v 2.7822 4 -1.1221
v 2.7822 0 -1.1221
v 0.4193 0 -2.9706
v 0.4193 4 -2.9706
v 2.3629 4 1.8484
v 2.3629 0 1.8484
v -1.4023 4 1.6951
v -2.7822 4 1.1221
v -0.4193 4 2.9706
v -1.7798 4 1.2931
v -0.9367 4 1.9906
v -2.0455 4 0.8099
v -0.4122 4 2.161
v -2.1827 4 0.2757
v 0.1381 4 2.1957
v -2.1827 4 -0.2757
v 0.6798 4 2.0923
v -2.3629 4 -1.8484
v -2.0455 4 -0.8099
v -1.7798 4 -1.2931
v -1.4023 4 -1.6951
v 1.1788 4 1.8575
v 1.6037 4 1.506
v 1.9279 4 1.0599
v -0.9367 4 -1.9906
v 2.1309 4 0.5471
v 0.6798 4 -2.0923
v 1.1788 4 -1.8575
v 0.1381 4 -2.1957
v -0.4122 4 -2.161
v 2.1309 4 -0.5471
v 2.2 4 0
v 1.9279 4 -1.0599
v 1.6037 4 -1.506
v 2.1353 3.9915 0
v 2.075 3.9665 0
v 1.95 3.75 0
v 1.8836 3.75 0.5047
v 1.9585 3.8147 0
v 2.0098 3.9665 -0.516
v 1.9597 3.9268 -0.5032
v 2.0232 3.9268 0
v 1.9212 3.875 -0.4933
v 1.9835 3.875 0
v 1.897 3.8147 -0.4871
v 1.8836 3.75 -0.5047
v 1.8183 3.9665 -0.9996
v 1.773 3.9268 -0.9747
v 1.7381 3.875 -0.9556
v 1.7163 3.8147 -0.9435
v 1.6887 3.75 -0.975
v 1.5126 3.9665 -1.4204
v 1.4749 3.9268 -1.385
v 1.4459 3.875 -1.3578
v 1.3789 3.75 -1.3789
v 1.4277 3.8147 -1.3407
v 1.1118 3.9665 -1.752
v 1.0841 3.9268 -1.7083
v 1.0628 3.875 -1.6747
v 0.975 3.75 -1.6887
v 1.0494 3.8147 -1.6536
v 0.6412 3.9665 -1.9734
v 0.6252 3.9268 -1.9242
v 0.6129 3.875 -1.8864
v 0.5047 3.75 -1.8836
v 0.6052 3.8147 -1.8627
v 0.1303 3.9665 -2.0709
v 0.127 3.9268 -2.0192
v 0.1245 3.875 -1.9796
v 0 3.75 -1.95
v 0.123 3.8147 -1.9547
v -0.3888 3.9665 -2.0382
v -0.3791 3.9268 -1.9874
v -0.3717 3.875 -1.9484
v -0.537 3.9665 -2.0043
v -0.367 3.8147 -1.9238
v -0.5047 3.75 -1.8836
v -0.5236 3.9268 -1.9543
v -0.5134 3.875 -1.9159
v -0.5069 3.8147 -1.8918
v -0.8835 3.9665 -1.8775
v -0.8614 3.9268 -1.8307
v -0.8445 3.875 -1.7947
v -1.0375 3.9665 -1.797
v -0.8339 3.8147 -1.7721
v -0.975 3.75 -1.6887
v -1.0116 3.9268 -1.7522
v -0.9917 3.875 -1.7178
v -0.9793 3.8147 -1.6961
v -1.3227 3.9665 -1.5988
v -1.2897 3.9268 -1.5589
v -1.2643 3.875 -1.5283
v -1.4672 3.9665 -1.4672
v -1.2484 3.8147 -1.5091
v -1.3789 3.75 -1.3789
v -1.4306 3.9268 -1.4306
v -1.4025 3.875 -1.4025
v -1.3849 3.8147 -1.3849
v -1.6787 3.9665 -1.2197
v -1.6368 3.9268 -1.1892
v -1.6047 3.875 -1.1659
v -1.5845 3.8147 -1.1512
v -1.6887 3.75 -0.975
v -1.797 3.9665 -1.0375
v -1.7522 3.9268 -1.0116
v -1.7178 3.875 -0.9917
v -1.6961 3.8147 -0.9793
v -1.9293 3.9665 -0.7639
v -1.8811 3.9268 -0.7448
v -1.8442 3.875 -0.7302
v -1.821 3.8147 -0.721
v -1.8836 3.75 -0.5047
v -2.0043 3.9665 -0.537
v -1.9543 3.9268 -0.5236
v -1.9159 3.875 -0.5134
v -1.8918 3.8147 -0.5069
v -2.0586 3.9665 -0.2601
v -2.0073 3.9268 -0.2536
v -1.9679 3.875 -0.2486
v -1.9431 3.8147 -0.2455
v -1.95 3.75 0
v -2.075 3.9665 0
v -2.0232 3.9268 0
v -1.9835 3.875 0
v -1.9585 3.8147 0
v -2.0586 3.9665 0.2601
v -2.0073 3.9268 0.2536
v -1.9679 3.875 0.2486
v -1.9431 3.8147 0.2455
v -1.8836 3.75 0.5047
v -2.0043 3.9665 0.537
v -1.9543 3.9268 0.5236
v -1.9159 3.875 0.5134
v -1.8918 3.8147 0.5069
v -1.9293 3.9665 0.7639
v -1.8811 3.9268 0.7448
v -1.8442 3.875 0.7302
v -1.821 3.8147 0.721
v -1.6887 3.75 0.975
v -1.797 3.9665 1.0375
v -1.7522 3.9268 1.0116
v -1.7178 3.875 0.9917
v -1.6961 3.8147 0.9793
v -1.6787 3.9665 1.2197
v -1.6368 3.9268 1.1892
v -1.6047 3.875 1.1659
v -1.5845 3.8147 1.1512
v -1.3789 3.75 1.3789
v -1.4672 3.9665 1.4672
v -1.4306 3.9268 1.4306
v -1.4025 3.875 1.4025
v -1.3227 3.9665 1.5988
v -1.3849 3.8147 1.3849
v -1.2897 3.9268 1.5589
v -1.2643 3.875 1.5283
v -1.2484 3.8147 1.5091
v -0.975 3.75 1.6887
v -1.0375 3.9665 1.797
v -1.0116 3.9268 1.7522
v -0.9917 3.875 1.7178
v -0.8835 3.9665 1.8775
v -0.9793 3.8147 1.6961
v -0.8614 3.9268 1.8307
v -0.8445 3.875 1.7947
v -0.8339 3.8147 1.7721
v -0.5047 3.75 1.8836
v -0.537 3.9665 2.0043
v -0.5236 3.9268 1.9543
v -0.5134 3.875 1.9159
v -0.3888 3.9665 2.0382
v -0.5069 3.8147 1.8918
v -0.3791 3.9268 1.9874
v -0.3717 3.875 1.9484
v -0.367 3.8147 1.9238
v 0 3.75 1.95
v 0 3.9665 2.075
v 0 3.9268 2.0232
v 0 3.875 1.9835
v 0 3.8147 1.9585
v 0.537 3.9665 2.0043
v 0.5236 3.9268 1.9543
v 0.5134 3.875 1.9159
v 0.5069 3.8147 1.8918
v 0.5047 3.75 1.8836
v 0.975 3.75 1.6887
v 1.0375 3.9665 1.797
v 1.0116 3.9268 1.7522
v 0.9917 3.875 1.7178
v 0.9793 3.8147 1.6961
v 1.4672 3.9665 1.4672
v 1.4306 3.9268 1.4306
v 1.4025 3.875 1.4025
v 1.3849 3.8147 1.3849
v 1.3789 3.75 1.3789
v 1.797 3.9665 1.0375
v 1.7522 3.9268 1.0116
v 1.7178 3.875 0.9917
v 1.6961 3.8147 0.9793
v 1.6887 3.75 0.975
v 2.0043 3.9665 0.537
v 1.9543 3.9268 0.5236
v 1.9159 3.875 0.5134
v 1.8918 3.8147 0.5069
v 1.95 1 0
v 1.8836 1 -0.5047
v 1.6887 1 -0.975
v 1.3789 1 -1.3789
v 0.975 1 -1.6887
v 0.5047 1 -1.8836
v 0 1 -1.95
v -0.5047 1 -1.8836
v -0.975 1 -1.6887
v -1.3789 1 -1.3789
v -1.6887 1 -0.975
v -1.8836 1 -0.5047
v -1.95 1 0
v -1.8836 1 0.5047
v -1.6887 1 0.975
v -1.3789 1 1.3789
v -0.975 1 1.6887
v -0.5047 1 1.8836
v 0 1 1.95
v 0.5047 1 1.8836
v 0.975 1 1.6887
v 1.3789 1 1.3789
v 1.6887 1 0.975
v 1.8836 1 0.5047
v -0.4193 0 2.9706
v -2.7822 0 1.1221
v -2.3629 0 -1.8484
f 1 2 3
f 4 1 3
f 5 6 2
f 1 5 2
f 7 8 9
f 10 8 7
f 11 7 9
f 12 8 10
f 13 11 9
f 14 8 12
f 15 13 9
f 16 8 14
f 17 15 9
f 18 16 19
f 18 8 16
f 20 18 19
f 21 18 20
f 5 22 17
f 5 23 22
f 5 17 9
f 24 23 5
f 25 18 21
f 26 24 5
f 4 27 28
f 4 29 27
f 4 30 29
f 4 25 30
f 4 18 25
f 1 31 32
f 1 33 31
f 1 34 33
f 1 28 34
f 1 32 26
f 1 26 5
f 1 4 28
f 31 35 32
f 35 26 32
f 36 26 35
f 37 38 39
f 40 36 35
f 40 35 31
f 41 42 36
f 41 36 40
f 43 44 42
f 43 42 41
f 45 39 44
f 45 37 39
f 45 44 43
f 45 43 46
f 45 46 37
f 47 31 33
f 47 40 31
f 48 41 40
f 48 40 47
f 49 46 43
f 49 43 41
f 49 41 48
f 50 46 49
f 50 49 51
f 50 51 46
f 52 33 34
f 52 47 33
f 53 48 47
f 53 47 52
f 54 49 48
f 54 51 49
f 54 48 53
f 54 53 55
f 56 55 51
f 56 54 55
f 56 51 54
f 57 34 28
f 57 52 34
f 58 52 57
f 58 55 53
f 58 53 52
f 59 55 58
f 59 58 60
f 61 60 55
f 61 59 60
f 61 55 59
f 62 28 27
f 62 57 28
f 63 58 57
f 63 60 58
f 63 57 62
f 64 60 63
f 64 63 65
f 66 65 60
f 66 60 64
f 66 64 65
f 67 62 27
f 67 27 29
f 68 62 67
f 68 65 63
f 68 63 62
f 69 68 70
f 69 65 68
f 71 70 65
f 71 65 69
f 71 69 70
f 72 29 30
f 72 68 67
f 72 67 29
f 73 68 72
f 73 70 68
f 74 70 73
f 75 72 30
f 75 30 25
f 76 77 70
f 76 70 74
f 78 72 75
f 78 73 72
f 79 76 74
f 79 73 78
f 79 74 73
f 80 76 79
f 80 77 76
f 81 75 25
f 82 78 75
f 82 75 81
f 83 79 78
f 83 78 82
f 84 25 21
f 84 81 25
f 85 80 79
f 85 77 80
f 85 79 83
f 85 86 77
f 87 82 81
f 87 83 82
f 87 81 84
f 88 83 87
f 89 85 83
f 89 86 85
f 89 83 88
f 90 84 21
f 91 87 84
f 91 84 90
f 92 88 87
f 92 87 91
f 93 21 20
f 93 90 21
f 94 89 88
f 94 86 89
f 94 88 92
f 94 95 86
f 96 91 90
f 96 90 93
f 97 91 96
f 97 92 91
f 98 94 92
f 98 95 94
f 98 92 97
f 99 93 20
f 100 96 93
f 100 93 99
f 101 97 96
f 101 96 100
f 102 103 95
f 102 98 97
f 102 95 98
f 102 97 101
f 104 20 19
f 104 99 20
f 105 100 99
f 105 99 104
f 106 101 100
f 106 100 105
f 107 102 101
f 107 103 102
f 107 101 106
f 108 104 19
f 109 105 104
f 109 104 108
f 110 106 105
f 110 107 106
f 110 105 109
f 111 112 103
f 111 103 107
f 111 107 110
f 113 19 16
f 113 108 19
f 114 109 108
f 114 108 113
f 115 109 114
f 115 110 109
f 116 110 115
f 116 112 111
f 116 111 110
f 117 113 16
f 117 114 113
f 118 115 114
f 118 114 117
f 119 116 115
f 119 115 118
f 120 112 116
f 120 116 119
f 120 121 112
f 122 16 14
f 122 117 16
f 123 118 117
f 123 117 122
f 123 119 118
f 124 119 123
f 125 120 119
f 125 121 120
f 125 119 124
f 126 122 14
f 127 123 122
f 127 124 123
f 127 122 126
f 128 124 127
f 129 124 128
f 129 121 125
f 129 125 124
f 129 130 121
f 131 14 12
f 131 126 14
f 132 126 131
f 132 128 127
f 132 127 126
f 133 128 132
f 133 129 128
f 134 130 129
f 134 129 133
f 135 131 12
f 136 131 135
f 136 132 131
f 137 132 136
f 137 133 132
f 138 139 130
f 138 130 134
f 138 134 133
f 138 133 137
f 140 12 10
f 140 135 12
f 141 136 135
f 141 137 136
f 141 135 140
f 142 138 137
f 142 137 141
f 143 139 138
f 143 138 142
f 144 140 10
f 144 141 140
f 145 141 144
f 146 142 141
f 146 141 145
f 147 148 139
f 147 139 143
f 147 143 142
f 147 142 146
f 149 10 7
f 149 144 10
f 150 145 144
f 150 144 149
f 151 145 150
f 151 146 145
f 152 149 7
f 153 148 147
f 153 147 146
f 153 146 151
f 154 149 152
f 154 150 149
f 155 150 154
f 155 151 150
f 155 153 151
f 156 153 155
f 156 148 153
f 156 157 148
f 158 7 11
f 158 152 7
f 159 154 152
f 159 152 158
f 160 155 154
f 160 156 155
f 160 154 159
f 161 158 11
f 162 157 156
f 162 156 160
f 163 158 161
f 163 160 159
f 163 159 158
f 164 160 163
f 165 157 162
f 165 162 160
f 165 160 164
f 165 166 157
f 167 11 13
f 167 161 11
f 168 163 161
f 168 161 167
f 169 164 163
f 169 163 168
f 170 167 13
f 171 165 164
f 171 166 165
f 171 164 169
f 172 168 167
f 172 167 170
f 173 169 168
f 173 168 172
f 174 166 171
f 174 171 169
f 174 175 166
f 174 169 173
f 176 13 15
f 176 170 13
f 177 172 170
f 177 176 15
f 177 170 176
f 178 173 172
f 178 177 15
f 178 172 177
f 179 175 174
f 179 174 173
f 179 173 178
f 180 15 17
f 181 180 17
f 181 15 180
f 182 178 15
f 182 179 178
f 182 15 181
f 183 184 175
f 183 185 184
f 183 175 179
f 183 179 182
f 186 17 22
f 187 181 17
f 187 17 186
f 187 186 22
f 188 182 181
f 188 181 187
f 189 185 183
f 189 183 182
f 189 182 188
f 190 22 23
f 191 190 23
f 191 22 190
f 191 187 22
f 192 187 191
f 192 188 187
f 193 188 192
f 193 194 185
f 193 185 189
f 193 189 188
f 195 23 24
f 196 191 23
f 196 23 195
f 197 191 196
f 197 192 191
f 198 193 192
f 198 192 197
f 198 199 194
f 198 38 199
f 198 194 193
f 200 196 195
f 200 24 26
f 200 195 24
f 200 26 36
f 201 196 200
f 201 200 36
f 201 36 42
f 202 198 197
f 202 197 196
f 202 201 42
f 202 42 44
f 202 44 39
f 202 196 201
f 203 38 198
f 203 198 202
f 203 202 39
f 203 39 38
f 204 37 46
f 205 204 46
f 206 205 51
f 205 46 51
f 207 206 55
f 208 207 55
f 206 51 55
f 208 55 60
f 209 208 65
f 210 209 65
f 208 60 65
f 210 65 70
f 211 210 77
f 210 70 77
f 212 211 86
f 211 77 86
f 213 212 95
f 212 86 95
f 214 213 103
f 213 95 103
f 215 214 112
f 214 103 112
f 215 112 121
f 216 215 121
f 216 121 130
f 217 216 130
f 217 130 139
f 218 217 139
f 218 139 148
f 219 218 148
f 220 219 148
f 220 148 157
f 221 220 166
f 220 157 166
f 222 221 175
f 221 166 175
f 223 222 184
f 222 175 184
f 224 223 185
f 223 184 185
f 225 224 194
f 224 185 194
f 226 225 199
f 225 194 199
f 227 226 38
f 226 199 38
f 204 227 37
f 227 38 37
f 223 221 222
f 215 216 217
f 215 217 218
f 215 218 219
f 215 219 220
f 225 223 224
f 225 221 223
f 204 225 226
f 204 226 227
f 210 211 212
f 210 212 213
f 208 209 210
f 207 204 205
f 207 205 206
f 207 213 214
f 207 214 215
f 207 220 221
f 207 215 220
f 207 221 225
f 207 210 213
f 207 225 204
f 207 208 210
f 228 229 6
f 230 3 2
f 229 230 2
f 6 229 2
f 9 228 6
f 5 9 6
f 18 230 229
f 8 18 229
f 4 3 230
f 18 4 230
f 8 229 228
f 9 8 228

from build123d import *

# Parameters (mm, degrees)
BOSS_EXTRUDE1_DEPTH = 4
SKETCH2_R           = 1.95
CUT_EXTRUDE1_DEPTH  = 3
FILLET1_R           = 0.25


with BuildPart() as part:
    # Sketch1 → Boss-Extrude1 (new body)
    with BuildSketch(Plane(origin=(0, 0, 0), x_dir=(1, 0, 0), z_dir=(0, 1, 0))):
        Polygon((2.362917062, -1.848410928), (2.782229351, 1.122140739), (0.419312289, 2.970551667), (-2.362917062, 1.848410928), (-2.782229351, -1.122140739), (-0.419312289, -2.970551667), align=None)
    extrude(amount=BOSS_EXTRUDE1_DEPTH)

    # Sketch2 → Cut-Extrude1 (cut)
    with BuildSketch(Plane(origin=(0, 4, 0), x_dir=(1, 0, 0), z_dir=(0, 1, 0))):
        Circle(SKETCH2_R)
    extrude(amount=-CUT_EXTRUDE1_DEPTH, mode=Mode.SUBTRACT)

    # Fillet1
    fillet1_edges = [part.edges().sort_by_distance(p)[0] for p in [
        (-1.95, 4, 0),
    ]]
    fillet(fillet1_edges, radius=FILLET1_R)


solid = part.part
